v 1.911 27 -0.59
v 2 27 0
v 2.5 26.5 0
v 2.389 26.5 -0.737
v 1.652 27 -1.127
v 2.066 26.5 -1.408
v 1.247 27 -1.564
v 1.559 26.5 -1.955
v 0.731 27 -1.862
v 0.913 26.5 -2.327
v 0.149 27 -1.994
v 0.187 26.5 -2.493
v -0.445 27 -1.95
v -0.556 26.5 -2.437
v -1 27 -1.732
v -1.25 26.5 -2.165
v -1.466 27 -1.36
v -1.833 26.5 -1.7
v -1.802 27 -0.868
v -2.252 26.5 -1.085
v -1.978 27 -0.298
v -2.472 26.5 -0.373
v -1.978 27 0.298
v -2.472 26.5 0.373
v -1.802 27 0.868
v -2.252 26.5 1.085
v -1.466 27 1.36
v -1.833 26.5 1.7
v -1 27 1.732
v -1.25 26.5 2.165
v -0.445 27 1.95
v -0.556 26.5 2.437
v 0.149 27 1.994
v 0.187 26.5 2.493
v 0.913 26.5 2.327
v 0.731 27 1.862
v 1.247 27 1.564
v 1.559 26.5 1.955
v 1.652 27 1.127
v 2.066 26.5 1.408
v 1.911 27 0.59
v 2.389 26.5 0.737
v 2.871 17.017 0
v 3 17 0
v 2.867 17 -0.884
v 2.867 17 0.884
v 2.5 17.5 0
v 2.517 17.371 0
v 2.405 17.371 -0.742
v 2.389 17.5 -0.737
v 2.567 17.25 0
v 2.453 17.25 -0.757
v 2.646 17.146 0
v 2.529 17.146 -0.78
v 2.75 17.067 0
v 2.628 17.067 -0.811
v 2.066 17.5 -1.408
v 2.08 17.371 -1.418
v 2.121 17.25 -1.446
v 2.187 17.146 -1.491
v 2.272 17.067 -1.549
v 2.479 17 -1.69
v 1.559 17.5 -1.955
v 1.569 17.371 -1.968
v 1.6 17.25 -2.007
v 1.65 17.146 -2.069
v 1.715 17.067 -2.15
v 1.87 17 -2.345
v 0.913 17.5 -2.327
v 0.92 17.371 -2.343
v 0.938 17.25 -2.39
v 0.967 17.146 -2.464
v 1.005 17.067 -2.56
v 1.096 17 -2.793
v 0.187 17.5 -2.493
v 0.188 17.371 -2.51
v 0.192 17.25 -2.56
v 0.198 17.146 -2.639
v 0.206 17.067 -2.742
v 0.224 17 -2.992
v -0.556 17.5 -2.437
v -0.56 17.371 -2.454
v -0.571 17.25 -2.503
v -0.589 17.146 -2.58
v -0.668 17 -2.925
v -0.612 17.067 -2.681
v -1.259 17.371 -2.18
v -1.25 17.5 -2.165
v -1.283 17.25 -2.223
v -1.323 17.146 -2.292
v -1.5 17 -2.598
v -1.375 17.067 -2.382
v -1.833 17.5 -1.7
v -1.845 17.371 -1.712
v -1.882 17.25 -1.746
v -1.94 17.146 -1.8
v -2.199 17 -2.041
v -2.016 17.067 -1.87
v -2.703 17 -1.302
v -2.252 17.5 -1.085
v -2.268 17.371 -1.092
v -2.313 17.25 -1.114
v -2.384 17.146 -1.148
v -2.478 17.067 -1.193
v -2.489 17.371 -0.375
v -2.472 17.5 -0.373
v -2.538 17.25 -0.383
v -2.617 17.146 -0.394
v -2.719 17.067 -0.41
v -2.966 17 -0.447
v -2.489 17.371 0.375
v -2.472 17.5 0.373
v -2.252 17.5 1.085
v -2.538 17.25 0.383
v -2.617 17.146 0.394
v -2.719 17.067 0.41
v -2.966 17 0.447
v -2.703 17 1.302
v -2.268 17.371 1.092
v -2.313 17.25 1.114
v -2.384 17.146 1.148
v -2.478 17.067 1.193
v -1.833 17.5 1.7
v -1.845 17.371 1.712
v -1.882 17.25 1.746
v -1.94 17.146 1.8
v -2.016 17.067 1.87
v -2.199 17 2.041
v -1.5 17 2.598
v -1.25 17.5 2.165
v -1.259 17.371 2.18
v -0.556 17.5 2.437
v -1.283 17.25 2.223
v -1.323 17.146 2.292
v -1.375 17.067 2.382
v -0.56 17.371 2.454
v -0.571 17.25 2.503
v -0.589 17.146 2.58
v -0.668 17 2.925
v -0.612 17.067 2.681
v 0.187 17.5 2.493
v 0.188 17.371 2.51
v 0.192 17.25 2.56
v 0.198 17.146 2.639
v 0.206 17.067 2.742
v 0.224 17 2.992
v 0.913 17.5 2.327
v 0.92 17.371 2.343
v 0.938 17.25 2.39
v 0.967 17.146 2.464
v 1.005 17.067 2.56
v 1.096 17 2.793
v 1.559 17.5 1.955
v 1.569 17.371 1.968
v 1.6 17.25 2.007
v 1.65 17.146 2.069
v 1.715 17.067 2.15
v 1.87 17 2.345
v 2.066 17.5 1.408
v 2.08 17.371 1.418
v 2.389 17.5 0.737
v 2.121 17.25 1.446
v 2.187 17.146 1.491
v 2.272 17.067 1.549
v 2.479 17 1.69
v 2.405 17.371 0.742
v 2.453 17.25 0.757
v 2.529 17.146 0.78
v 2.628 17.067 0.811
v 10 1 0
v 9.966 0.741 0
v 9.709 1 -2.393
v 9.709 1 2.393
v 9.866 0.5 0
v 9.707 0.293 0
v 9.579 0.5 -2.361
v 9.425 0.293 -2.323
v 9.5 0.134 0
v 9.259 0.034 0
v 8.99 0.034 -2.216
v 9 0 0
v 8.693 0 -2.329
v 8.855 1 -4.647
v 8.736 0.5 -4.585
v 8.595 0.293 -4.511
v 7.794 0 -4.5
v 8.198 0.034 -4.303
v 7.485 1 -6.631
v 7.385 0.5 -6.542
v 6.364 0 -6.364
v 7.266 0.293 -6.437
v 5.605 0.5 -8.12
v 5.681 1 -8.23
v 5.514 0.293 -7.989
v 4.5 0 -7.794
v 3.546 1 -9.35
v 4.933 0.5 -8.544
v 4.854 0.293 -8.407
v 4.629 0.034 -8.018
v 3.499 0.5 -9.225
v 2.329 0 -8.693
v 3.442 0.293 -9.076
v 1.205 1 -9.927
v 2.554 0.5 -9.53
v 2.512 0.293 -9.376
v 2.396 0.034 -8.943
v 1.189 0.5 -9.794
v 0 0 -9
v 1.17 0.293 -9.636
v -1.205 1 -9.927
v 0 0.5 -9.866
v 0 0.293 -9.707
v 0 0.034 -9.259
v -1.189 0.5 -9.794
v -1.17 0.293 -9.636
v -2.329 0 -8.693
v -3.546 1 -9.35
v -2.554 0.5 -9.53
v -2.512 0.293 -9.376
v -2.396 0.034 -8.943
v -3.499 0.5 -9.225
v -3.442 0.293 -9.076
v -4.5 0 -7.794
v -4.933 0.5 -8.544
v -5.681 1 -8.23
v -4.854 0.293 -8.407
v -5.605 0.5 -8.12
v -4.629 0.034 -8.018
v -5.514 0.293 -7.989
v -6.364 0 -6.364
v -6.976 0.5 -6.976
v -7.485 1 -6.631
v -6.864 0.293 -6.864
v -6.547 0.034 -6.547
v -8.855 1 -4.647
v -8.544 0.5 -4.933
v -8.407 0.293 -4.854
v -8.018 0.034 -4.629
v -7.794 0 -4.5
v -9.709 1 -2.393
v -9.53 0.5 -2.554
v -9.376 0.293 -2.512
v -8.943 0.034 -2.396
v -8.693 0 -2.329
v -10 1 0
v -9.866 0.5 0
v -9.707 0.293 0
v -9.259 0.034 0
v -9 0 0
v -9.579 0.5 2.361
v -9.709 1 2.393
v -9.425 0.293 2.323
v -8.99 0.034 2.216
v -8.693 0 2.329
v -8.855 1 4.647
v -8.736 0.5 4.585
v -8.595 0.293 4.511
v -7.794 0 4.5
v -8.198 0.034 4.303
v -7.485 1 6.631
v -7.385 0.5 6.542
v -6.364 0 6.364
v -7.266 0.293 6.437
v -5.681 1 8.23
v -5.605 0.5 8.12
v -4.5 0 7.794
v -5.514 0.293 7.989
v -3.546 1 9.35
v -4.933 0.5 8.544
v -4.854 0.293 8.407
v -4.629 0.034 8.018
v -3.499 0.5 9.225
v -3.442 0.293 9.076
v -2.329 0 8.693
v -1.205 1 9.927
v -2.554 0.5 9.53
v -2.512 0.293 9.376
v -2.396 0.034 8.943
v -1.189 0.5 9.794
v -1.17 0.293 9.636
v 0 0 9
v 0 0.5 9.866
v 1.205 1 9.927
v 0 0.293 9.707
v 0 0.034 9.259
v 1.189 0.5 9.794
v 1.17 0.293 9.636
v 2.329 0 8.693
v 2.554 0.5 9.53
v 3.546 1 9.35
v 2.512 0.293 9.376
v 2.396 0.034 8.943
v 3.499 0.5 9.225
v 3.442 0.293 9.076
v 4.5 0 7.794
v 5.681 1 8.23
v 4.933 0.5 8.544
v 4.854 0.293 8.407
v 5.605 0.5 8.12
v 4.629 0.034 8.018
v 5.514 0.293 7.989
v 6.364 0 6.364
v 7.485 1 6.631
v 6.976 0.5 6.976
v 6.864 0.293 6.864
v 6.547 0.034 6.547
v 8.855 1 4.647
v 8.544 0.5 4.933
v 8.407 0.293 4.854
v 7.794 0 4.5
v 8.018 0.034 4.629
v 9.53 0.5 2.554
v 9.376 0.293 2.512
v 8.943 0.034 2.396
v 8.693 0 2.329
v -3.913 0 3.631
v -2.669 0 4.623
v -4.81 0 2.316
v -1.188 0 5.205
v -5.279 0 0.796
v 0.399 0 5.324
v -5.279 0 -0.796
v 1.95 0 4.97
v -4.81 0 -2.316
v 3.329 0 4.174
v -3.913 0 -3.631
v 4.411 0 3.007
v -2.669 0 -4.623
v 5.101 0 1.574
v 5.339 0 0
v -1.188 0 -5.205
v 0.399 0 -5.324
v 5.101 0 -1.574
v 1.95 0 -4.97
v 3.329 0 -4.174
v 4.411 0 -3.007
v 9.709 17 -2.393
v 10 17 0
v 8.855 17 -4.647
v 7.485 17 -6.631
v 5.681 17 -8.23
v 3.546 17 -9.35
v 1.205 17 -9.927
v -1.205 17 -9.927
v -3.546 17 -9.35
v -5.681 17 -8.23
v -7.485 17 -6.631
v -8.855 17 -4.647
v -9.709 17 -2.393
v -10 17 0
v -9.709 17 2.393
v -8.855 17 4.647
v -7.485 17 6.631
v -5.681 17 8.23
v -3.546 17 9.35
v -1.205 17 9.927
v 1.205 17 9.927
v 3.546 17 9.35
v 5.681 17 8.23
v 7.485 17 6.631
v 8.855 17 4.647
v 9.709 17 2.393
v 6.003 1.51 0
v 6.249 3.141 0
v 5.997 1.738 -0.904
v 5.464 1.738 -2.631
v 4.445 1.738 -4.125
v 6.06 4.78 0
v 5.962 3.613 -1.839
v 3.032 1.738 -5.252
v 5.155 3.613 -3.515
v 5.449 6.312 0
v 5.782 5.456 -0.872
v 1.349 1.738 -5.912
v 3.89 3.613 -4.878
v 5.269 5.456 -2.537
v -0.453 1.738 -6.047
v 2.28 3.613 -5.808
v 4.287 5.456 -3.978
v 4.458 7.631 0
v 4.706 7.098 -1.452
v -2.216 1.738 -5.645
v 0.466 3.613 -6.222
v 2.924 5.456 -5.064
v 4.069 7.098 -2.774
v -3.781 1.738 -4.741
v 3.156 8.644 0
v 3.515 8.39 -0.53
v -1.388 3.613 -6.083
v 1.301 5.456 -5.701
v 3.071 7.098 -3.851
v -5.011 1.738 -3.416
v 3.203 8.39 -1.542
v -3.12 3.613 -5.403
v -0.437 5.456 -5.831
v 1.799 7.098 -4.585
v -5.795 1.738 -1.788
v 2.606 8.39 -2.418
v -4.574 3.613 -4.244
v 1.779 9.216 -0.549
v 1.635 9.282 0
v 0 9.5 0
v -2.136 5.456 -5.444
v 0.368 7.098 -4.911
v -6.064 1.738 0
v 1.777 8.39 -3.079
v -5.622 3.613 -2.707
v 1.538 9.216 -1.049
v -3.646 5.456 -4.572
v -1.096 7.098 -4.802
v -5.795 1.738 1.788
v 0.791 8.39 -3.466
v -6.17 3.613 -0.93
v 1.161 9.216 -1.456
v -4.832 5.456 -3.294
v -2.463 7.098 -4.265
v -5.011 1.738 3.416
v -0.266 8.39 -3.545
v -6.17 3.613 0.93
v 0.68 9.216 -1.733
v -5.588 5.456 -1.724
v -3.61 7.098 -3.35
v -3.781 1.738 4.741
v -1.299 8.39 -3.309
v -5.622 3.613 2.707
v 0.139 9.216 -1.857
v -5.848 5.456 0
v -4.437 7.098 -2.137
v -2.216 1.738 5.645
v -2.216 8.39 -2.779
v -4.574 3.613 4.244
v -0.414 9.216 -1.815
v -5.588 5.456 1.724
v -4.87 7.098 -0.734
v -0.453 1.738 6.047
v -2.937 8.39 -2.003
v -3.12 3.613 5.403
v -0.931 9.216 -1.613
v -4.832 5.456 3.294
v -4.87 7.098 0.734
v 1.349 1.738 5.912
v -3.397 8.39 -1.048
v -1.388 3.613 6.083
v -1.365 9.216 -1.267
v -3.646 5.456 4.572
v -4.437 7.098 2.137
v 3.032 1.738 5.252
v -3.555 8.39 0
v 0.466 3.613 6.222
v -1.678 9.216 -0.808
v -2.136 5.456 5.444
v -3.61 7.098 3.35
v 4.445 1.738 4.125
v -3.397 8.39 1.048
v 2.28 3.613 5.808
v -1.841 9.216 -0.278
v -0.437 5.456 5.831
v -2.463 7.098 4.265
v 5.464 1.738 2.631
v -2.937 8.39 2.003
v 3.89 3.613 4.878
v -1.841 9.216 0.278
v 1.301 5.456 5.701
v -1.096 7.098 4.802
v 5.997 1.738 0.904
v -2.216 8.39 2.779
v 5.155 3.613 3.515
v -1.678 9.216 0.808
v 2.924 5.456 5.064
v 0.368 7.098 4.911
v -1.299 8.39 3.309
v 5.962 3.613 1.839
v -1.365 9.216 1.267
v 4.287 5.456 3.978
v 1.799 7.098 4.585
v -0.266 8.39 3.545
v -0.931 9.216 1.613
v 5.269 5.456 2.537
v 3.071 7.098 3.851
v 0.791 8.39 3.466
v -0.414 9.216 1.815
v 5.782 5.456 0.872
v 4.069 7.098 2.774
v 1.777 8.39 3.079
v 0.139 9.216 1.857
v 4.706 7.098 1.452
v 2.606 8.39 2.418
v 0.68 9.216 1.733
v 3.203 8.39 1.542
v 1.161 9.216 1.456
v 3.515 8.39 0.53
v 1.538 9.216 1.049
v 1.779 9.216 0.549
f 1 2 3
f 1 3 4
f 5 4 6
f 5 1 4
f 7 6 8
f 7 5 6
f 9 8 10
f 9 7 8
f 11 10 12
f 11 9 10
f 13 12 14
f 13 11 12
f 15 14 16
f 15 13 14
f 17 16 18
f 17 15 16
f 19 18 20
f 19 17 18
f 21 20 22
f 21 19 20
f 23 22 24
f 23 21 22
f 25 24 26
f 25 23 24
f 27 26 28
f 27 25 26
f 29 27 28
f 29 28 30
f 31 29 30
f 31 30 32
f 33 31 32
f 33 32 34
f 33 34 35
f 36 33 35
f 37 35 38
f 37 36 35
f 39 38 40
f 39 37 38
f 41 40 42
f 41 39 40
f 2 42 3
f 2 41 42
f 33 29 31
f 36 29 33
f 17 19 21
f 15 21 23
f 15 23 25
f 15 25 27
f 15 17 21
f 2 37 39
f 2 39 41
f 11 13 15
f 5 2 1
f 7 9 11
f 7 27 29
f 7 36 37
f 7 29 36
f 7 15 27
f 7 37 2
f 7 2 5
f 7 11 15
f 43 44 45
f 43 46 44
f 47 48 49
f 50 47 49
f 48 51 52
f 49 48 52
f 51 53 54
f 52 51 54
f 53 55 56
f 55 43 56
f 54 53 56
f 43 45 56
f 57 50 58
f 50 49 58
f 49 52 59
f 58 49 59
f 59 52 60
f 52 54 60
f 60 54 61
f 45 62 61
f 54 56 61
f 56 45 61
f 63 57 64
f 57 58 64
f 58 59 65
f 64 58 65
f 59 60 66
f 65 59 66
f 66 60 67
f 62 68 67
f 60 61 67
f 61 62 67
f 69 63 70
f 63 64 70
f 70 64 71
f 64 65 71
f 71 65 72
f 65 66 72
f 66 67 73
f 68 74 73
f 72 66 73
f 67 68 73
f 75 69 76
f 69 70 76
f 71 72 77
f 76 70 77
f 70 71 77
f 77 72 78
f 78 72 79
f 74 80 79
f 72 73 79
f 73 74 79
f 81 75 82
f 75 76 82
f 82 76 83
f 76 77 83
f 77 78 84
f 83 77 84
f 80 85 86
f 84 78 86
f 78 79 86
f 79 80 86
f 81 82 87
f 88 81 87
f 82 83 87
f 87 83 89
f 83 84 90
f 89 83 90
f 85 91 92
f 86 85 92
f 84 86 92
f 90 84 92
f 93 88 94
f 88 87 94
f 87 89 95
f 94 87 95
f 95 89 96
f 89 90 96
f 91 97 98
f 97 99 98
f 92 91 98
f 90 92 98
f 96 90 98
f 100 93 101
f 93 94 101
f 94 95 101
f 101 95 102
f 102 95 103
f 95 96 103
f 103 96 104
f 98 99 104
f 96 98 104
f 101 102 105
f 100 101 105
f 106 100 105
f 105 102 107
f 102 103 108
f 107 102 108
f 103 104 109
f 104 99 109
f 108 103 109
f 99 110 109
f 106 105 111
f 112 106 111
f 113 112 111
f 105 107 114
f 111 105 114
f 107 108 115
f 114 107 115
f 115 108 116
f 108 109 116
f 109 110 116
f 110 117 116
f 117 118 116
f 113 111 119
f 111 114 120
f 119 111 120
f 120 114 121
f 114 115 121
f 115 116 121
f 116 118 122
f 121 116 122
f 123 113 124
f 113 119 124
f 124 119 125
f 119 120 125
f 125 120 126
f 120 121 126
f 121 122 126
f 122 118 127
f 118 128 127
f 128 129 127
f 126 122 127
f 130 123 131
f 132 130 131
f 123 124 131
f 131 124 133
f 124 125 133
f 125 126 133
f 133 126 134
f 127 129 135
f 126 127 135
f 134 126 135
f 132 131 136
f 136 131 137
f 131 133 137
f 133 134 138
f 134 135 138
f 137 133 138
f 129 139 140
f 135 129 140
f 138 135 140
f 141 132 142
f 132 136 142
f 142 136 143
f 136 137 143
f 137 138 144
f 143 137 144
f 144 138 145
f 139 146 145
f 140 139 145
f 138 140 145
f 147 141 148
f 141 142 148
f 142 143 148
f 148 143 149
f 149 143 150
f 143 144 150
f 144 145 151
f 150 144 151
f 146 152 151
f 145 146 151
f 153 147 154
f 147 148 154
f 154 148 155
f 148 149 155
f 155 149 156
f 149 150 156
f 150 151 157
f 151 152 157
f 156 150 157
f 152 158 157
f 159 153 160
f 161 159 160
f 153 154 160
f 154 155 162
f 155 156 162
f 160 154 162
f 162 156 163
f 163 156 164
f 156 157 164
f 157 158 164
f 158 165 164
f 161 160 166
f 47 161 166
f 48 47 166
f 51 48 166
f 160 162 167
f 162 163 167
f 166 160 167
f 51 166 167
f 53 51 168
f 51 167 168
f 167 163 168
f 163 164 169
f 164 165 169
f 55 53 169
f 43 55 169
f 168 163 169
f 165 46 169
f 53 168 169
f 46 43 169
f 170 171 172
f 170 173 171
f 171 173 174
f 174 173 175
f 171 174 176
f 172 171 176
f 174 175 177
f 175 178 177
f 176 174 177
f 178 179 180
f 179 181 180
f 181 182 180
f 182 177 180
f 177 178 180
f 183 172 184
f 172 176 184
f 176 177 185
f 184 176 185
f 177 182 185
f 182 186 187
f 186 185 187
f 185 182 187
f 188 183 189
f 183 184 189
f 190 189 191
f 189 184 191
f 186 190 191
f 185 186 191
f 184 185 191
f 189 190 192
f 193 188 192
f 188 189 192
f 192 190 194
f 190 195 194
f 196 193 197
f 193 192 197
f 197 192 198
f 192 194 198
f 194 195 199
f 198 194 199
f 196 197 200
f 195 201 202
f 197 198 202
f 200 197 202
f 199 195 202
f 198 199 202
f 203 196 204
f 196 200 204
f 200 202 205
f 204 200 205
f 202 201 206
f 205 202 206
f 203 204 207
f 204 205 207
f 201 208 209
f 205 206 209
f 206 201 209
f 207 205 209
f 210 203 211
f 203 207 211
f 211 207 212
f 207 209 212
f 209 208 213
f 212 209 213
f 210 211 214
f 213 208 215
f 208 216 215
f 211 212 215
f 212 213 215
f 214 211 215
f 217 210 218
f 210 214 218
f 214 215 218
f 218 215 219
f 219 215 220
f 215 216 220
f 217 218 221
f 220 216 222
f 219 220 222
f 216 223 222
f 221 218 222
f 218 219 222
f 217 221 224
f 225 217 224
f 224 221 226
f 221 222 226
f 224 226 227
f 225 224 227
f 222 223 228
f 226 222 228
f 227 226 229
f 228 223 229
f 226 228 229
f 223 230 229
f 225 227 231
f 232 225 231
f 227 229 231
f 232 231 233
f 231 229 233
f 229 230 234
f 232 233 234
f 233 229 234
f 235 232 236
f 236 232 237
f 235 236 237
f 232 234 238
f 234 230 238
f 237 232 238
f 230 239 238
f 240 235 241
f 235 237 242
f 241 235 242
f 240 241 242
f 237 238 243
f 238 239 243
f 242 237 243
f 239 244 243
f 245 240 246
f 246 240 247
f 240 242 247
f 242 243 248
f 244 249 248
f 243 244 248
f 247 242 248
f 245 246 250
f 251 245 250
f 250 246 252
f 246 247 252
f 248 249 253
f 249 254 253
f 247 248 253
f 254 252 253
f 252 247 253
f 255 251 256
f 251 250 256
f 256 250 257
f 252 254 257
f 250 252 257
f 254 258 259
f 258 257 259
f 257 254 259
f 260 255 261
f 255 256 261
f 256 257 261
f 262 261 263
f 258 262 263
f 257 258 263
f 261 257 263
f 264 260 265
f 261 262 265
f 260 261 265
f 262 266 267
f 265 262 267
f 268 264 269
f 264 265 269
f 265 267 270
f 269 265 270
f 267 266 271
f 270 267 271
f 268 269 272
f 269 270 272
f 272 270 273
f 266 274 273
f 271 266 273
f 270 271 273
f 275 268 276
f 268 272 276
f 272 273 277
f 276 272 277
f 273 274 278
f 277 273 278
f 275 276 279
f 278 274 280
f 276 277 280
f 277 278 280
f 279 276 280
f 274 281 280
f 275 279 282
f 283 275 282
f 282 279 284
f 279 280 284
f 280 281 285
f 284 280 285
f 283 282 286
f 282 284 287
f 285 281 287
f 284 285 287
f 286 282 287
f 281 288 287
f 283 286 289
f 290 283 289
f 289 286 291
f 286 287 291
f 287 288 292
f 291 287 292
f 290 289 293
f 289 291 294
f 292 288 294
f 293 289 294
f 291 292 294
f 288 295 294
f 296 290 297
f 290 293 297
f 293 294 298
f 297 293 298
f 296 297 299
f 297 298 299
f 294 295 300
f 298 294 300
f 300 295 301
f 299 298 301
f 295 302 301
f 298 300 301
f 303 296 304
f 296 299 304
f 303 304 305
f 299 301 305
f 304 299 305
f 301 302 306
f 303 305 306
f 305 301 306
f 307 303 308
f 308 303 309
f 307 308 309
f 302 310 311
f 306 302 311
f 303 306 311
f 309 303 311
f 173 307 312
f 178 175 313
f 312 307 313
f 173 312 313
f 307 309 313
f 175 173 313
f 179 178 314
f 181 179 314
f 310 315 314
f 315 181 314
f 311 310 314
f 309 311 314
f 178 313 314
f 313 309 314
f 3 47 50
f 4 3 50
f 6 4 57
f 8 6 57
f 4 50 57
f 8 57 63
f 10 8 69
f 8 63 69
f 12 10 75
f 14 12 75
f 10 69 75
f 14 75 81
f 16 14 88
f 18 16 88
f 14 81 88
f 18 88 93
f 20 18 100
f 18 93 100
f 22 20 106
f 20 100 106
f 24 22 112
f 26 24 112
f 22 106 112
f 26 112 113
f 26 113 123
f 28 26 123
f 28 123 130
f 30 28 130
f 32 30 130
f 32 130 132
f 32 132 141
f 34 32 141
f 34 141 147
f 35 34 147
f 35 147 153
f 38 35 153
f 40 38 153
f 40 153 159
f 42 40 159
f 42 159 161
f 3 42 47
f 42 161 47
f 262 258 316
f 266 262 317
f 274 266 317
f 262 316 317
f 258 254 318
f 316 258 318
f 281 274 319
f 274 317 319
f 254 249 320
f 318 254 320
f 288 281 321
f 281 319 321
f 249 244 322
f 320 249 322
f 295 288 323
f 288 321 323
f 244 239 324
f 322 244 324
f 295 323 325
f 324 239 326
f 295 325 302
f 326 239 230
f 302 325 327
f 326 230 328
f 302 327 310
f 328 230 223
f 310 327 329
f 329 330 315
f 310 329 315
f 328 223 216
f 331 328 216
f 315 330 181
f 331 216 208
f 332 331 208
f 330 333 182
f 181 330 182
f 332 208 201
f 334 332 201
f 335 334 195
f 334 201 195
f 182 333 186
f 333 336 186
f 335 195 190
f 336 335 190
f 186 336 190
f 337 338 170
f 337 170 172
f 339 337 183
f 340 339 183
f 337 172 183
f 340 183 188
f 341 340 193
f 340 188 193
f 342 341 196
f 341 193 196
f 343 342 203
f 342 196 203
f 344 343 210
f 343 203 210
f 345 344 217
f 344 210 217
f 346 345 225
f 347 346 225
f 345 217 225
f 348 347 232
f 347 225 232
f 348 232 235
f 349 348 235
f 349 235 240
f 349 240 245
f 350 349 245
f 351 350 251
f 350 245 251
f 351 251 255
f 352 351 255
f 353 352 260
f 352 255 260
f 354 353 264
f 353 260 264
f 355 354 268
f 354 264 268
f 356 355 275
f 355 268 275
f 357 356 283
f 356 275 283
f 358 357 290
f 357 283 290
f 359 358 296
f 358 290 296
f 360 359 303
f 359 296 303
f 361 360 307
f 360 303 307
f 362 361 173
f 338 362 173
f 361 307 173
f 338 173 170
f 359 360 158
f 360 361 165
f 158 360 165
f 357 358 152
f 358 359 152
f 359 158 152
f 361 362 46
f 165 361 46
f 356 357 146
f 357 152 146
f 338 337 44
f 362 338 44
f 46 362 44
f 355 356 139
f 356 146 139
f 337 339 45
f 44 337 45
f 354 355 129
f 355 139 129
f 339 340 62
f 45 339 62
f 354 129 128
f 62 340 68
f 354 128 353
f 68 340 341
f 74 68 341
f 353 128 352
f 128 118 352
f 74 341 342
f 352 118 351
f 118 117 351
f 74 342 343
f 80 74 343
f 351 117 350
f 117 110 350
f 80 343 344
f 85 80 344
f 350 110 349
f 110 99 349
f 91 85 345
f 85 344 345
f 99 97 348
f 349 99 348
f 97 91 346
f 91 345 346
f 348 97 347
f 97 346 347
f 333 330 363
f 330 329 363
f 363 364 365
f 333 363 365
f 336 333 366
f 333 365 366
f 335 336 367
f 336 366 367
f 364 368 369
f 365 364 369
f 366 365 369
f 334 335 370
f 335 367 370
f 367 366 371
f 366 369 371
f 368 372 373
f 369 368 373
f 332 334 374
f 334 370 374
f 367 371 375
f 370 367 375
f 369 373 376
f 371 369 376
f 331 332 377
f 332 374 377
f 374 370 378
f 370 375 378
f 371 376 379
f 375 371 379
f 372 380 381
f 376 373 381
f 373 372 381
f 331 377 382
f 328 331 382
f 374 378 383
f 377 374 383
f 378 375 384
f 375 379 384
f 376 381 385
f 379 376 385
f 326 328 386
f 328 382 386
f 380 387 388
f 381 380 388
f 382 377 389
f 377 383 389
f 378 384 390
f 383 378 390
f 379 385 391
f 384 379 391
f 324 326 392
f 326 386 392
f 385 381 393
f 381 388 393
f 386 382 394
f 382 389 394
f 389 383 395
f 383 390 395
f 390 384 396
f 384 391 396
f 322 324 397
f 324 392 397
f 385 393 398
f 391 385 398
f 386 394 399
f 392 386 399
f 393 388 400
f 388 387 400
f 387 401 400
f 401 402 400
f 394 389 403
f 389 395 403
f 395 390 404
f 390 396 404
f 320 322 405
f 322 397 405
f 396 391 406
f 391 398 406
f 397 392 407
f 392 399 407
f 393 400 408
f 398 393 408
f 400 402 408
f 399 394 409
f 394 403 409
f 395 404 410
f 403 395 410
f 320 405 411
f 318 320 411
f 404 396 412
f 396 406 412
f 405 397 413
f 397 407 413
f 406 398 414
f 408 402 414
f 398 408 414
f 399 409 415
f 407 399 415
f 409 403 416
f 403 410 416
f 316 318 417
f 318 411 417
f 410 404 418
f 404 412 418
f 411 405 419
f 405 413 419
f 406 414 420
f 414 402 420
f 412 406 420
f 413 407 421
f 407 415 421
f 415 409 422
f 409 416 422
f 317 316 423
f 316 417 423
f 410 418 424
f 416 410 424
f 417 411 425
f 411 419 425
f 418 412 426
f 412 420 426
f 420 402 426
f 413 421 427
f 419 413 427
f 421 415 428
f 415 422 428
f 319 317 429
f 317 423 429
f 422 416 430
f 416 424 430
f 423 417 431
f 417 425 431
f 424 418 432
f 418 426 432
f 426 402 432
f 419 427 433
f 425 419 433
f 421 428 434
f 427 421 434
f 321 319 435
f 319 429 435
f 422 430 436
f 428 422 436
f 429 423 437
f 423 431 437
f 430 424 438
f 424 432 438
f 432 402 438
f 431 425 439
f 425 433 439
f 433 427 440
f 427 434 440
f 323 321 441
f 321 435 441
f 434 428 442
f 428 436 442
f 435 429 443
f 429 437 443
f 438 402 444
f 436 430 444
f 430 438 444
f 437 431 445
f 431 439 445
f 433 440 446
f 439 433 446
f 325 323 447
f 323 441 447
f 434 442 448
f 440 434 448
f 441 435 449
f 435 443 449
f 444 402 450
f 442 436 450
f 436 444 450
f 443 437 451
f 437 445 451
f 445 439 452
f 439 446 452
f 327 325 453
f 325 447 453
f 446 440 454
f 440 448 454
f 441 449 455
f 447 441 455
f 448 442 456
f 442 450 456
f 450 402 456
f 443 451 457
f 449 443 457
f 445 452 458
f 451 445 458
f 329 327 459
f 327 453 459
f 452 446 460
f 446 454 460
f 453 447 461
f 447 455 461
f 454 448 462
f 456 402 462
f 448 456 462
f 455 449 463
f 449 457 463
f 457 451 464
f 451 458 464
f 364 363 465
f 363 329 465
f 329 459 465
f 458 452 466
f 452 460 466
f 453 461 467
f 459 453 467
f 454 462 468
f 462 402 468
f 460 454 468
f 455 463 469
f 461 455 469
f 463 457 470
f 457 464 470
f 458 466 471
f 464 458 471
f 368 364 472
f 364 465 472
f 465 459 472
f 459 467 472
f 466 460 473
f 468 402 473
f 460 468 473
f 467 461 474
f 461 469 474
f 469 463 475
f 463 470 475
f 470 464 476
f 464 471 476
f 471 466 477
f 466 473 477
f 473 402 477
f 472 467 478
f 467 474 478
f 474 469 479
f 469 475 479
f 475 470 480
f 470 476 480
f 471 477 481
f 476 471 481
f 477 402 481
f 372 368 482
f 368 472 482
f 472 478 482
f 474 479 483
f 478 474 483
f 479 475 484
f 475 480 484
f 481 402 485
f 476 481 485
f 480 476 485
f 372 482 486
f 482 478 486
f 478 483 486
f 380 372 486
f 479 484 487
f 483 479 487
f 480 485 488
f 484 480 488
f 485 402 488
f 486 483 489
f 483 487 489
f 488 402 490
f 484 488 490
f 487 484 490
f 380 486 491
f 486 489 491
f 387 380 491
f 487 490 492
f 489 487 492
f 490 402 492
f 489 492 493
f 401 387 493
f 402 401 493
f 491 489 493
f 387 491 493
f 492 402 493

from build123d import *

# Parameters (mm, degrees)
ESQUISSE2_R      = 2.5
EXTRUSION1_DEPTH = 10
CONG_1_R         = 1
CHANFREIN1_SIZE  = 0.5
CONG_2_R         = 0.5


with BuildPart() as part:
    # Esquisse1 → Révolution1 (revolve)
    with BuildSketch(Plane.XY):
        with BuildLine():
            Line((0, 17), (10, 17))
            Line((10, 17), (10, 0))
            Line((10, 0), (5.338539126, 0))
            ThreePointArc((5.338539126, 0), (5.448623679, 6.311862178), (0, 9.5))
            Line((0, 9.5), (0, 17))
        make_face()
    revolve(axis=Axis((0, 0, 0), (0, 1, 0)))

    # Esquisse2 → Extrusion1 (add)
    with BuildSketch(Plane(origin=(0, 17, 0), x_dir=(1, 0, 0), z_dir=(0, 1, 0))):
        Circle(ESQUISSE2_R)
    extrude(amount=EXTRUSION1_DEPTH)

    # Congé1
    cong_1_edges = [part.edges().sort_by_distance(p)[0] for p in [
        (-10, 0, 0),
    ]]
    fillet(cong_1_edges, radius=CONG_1_R)

    # Chanfrein1
    chanfrein1_edges = [part.edges().sort_by_distance(p)[0] for p in [
        (-2.5, 27, 0),
    ]]
    chamfer(chanfrein1_edges, length=CHANFREIN1_SIZE)

    # Congé2
    cong_2_edges = [part.edges().sort_by_distance(p)[0] for p in [
        (-2.5, 17, 0),
    ]]
    fillet(cong_2_edges, radius=CONG_2_R)


solid = part.part
